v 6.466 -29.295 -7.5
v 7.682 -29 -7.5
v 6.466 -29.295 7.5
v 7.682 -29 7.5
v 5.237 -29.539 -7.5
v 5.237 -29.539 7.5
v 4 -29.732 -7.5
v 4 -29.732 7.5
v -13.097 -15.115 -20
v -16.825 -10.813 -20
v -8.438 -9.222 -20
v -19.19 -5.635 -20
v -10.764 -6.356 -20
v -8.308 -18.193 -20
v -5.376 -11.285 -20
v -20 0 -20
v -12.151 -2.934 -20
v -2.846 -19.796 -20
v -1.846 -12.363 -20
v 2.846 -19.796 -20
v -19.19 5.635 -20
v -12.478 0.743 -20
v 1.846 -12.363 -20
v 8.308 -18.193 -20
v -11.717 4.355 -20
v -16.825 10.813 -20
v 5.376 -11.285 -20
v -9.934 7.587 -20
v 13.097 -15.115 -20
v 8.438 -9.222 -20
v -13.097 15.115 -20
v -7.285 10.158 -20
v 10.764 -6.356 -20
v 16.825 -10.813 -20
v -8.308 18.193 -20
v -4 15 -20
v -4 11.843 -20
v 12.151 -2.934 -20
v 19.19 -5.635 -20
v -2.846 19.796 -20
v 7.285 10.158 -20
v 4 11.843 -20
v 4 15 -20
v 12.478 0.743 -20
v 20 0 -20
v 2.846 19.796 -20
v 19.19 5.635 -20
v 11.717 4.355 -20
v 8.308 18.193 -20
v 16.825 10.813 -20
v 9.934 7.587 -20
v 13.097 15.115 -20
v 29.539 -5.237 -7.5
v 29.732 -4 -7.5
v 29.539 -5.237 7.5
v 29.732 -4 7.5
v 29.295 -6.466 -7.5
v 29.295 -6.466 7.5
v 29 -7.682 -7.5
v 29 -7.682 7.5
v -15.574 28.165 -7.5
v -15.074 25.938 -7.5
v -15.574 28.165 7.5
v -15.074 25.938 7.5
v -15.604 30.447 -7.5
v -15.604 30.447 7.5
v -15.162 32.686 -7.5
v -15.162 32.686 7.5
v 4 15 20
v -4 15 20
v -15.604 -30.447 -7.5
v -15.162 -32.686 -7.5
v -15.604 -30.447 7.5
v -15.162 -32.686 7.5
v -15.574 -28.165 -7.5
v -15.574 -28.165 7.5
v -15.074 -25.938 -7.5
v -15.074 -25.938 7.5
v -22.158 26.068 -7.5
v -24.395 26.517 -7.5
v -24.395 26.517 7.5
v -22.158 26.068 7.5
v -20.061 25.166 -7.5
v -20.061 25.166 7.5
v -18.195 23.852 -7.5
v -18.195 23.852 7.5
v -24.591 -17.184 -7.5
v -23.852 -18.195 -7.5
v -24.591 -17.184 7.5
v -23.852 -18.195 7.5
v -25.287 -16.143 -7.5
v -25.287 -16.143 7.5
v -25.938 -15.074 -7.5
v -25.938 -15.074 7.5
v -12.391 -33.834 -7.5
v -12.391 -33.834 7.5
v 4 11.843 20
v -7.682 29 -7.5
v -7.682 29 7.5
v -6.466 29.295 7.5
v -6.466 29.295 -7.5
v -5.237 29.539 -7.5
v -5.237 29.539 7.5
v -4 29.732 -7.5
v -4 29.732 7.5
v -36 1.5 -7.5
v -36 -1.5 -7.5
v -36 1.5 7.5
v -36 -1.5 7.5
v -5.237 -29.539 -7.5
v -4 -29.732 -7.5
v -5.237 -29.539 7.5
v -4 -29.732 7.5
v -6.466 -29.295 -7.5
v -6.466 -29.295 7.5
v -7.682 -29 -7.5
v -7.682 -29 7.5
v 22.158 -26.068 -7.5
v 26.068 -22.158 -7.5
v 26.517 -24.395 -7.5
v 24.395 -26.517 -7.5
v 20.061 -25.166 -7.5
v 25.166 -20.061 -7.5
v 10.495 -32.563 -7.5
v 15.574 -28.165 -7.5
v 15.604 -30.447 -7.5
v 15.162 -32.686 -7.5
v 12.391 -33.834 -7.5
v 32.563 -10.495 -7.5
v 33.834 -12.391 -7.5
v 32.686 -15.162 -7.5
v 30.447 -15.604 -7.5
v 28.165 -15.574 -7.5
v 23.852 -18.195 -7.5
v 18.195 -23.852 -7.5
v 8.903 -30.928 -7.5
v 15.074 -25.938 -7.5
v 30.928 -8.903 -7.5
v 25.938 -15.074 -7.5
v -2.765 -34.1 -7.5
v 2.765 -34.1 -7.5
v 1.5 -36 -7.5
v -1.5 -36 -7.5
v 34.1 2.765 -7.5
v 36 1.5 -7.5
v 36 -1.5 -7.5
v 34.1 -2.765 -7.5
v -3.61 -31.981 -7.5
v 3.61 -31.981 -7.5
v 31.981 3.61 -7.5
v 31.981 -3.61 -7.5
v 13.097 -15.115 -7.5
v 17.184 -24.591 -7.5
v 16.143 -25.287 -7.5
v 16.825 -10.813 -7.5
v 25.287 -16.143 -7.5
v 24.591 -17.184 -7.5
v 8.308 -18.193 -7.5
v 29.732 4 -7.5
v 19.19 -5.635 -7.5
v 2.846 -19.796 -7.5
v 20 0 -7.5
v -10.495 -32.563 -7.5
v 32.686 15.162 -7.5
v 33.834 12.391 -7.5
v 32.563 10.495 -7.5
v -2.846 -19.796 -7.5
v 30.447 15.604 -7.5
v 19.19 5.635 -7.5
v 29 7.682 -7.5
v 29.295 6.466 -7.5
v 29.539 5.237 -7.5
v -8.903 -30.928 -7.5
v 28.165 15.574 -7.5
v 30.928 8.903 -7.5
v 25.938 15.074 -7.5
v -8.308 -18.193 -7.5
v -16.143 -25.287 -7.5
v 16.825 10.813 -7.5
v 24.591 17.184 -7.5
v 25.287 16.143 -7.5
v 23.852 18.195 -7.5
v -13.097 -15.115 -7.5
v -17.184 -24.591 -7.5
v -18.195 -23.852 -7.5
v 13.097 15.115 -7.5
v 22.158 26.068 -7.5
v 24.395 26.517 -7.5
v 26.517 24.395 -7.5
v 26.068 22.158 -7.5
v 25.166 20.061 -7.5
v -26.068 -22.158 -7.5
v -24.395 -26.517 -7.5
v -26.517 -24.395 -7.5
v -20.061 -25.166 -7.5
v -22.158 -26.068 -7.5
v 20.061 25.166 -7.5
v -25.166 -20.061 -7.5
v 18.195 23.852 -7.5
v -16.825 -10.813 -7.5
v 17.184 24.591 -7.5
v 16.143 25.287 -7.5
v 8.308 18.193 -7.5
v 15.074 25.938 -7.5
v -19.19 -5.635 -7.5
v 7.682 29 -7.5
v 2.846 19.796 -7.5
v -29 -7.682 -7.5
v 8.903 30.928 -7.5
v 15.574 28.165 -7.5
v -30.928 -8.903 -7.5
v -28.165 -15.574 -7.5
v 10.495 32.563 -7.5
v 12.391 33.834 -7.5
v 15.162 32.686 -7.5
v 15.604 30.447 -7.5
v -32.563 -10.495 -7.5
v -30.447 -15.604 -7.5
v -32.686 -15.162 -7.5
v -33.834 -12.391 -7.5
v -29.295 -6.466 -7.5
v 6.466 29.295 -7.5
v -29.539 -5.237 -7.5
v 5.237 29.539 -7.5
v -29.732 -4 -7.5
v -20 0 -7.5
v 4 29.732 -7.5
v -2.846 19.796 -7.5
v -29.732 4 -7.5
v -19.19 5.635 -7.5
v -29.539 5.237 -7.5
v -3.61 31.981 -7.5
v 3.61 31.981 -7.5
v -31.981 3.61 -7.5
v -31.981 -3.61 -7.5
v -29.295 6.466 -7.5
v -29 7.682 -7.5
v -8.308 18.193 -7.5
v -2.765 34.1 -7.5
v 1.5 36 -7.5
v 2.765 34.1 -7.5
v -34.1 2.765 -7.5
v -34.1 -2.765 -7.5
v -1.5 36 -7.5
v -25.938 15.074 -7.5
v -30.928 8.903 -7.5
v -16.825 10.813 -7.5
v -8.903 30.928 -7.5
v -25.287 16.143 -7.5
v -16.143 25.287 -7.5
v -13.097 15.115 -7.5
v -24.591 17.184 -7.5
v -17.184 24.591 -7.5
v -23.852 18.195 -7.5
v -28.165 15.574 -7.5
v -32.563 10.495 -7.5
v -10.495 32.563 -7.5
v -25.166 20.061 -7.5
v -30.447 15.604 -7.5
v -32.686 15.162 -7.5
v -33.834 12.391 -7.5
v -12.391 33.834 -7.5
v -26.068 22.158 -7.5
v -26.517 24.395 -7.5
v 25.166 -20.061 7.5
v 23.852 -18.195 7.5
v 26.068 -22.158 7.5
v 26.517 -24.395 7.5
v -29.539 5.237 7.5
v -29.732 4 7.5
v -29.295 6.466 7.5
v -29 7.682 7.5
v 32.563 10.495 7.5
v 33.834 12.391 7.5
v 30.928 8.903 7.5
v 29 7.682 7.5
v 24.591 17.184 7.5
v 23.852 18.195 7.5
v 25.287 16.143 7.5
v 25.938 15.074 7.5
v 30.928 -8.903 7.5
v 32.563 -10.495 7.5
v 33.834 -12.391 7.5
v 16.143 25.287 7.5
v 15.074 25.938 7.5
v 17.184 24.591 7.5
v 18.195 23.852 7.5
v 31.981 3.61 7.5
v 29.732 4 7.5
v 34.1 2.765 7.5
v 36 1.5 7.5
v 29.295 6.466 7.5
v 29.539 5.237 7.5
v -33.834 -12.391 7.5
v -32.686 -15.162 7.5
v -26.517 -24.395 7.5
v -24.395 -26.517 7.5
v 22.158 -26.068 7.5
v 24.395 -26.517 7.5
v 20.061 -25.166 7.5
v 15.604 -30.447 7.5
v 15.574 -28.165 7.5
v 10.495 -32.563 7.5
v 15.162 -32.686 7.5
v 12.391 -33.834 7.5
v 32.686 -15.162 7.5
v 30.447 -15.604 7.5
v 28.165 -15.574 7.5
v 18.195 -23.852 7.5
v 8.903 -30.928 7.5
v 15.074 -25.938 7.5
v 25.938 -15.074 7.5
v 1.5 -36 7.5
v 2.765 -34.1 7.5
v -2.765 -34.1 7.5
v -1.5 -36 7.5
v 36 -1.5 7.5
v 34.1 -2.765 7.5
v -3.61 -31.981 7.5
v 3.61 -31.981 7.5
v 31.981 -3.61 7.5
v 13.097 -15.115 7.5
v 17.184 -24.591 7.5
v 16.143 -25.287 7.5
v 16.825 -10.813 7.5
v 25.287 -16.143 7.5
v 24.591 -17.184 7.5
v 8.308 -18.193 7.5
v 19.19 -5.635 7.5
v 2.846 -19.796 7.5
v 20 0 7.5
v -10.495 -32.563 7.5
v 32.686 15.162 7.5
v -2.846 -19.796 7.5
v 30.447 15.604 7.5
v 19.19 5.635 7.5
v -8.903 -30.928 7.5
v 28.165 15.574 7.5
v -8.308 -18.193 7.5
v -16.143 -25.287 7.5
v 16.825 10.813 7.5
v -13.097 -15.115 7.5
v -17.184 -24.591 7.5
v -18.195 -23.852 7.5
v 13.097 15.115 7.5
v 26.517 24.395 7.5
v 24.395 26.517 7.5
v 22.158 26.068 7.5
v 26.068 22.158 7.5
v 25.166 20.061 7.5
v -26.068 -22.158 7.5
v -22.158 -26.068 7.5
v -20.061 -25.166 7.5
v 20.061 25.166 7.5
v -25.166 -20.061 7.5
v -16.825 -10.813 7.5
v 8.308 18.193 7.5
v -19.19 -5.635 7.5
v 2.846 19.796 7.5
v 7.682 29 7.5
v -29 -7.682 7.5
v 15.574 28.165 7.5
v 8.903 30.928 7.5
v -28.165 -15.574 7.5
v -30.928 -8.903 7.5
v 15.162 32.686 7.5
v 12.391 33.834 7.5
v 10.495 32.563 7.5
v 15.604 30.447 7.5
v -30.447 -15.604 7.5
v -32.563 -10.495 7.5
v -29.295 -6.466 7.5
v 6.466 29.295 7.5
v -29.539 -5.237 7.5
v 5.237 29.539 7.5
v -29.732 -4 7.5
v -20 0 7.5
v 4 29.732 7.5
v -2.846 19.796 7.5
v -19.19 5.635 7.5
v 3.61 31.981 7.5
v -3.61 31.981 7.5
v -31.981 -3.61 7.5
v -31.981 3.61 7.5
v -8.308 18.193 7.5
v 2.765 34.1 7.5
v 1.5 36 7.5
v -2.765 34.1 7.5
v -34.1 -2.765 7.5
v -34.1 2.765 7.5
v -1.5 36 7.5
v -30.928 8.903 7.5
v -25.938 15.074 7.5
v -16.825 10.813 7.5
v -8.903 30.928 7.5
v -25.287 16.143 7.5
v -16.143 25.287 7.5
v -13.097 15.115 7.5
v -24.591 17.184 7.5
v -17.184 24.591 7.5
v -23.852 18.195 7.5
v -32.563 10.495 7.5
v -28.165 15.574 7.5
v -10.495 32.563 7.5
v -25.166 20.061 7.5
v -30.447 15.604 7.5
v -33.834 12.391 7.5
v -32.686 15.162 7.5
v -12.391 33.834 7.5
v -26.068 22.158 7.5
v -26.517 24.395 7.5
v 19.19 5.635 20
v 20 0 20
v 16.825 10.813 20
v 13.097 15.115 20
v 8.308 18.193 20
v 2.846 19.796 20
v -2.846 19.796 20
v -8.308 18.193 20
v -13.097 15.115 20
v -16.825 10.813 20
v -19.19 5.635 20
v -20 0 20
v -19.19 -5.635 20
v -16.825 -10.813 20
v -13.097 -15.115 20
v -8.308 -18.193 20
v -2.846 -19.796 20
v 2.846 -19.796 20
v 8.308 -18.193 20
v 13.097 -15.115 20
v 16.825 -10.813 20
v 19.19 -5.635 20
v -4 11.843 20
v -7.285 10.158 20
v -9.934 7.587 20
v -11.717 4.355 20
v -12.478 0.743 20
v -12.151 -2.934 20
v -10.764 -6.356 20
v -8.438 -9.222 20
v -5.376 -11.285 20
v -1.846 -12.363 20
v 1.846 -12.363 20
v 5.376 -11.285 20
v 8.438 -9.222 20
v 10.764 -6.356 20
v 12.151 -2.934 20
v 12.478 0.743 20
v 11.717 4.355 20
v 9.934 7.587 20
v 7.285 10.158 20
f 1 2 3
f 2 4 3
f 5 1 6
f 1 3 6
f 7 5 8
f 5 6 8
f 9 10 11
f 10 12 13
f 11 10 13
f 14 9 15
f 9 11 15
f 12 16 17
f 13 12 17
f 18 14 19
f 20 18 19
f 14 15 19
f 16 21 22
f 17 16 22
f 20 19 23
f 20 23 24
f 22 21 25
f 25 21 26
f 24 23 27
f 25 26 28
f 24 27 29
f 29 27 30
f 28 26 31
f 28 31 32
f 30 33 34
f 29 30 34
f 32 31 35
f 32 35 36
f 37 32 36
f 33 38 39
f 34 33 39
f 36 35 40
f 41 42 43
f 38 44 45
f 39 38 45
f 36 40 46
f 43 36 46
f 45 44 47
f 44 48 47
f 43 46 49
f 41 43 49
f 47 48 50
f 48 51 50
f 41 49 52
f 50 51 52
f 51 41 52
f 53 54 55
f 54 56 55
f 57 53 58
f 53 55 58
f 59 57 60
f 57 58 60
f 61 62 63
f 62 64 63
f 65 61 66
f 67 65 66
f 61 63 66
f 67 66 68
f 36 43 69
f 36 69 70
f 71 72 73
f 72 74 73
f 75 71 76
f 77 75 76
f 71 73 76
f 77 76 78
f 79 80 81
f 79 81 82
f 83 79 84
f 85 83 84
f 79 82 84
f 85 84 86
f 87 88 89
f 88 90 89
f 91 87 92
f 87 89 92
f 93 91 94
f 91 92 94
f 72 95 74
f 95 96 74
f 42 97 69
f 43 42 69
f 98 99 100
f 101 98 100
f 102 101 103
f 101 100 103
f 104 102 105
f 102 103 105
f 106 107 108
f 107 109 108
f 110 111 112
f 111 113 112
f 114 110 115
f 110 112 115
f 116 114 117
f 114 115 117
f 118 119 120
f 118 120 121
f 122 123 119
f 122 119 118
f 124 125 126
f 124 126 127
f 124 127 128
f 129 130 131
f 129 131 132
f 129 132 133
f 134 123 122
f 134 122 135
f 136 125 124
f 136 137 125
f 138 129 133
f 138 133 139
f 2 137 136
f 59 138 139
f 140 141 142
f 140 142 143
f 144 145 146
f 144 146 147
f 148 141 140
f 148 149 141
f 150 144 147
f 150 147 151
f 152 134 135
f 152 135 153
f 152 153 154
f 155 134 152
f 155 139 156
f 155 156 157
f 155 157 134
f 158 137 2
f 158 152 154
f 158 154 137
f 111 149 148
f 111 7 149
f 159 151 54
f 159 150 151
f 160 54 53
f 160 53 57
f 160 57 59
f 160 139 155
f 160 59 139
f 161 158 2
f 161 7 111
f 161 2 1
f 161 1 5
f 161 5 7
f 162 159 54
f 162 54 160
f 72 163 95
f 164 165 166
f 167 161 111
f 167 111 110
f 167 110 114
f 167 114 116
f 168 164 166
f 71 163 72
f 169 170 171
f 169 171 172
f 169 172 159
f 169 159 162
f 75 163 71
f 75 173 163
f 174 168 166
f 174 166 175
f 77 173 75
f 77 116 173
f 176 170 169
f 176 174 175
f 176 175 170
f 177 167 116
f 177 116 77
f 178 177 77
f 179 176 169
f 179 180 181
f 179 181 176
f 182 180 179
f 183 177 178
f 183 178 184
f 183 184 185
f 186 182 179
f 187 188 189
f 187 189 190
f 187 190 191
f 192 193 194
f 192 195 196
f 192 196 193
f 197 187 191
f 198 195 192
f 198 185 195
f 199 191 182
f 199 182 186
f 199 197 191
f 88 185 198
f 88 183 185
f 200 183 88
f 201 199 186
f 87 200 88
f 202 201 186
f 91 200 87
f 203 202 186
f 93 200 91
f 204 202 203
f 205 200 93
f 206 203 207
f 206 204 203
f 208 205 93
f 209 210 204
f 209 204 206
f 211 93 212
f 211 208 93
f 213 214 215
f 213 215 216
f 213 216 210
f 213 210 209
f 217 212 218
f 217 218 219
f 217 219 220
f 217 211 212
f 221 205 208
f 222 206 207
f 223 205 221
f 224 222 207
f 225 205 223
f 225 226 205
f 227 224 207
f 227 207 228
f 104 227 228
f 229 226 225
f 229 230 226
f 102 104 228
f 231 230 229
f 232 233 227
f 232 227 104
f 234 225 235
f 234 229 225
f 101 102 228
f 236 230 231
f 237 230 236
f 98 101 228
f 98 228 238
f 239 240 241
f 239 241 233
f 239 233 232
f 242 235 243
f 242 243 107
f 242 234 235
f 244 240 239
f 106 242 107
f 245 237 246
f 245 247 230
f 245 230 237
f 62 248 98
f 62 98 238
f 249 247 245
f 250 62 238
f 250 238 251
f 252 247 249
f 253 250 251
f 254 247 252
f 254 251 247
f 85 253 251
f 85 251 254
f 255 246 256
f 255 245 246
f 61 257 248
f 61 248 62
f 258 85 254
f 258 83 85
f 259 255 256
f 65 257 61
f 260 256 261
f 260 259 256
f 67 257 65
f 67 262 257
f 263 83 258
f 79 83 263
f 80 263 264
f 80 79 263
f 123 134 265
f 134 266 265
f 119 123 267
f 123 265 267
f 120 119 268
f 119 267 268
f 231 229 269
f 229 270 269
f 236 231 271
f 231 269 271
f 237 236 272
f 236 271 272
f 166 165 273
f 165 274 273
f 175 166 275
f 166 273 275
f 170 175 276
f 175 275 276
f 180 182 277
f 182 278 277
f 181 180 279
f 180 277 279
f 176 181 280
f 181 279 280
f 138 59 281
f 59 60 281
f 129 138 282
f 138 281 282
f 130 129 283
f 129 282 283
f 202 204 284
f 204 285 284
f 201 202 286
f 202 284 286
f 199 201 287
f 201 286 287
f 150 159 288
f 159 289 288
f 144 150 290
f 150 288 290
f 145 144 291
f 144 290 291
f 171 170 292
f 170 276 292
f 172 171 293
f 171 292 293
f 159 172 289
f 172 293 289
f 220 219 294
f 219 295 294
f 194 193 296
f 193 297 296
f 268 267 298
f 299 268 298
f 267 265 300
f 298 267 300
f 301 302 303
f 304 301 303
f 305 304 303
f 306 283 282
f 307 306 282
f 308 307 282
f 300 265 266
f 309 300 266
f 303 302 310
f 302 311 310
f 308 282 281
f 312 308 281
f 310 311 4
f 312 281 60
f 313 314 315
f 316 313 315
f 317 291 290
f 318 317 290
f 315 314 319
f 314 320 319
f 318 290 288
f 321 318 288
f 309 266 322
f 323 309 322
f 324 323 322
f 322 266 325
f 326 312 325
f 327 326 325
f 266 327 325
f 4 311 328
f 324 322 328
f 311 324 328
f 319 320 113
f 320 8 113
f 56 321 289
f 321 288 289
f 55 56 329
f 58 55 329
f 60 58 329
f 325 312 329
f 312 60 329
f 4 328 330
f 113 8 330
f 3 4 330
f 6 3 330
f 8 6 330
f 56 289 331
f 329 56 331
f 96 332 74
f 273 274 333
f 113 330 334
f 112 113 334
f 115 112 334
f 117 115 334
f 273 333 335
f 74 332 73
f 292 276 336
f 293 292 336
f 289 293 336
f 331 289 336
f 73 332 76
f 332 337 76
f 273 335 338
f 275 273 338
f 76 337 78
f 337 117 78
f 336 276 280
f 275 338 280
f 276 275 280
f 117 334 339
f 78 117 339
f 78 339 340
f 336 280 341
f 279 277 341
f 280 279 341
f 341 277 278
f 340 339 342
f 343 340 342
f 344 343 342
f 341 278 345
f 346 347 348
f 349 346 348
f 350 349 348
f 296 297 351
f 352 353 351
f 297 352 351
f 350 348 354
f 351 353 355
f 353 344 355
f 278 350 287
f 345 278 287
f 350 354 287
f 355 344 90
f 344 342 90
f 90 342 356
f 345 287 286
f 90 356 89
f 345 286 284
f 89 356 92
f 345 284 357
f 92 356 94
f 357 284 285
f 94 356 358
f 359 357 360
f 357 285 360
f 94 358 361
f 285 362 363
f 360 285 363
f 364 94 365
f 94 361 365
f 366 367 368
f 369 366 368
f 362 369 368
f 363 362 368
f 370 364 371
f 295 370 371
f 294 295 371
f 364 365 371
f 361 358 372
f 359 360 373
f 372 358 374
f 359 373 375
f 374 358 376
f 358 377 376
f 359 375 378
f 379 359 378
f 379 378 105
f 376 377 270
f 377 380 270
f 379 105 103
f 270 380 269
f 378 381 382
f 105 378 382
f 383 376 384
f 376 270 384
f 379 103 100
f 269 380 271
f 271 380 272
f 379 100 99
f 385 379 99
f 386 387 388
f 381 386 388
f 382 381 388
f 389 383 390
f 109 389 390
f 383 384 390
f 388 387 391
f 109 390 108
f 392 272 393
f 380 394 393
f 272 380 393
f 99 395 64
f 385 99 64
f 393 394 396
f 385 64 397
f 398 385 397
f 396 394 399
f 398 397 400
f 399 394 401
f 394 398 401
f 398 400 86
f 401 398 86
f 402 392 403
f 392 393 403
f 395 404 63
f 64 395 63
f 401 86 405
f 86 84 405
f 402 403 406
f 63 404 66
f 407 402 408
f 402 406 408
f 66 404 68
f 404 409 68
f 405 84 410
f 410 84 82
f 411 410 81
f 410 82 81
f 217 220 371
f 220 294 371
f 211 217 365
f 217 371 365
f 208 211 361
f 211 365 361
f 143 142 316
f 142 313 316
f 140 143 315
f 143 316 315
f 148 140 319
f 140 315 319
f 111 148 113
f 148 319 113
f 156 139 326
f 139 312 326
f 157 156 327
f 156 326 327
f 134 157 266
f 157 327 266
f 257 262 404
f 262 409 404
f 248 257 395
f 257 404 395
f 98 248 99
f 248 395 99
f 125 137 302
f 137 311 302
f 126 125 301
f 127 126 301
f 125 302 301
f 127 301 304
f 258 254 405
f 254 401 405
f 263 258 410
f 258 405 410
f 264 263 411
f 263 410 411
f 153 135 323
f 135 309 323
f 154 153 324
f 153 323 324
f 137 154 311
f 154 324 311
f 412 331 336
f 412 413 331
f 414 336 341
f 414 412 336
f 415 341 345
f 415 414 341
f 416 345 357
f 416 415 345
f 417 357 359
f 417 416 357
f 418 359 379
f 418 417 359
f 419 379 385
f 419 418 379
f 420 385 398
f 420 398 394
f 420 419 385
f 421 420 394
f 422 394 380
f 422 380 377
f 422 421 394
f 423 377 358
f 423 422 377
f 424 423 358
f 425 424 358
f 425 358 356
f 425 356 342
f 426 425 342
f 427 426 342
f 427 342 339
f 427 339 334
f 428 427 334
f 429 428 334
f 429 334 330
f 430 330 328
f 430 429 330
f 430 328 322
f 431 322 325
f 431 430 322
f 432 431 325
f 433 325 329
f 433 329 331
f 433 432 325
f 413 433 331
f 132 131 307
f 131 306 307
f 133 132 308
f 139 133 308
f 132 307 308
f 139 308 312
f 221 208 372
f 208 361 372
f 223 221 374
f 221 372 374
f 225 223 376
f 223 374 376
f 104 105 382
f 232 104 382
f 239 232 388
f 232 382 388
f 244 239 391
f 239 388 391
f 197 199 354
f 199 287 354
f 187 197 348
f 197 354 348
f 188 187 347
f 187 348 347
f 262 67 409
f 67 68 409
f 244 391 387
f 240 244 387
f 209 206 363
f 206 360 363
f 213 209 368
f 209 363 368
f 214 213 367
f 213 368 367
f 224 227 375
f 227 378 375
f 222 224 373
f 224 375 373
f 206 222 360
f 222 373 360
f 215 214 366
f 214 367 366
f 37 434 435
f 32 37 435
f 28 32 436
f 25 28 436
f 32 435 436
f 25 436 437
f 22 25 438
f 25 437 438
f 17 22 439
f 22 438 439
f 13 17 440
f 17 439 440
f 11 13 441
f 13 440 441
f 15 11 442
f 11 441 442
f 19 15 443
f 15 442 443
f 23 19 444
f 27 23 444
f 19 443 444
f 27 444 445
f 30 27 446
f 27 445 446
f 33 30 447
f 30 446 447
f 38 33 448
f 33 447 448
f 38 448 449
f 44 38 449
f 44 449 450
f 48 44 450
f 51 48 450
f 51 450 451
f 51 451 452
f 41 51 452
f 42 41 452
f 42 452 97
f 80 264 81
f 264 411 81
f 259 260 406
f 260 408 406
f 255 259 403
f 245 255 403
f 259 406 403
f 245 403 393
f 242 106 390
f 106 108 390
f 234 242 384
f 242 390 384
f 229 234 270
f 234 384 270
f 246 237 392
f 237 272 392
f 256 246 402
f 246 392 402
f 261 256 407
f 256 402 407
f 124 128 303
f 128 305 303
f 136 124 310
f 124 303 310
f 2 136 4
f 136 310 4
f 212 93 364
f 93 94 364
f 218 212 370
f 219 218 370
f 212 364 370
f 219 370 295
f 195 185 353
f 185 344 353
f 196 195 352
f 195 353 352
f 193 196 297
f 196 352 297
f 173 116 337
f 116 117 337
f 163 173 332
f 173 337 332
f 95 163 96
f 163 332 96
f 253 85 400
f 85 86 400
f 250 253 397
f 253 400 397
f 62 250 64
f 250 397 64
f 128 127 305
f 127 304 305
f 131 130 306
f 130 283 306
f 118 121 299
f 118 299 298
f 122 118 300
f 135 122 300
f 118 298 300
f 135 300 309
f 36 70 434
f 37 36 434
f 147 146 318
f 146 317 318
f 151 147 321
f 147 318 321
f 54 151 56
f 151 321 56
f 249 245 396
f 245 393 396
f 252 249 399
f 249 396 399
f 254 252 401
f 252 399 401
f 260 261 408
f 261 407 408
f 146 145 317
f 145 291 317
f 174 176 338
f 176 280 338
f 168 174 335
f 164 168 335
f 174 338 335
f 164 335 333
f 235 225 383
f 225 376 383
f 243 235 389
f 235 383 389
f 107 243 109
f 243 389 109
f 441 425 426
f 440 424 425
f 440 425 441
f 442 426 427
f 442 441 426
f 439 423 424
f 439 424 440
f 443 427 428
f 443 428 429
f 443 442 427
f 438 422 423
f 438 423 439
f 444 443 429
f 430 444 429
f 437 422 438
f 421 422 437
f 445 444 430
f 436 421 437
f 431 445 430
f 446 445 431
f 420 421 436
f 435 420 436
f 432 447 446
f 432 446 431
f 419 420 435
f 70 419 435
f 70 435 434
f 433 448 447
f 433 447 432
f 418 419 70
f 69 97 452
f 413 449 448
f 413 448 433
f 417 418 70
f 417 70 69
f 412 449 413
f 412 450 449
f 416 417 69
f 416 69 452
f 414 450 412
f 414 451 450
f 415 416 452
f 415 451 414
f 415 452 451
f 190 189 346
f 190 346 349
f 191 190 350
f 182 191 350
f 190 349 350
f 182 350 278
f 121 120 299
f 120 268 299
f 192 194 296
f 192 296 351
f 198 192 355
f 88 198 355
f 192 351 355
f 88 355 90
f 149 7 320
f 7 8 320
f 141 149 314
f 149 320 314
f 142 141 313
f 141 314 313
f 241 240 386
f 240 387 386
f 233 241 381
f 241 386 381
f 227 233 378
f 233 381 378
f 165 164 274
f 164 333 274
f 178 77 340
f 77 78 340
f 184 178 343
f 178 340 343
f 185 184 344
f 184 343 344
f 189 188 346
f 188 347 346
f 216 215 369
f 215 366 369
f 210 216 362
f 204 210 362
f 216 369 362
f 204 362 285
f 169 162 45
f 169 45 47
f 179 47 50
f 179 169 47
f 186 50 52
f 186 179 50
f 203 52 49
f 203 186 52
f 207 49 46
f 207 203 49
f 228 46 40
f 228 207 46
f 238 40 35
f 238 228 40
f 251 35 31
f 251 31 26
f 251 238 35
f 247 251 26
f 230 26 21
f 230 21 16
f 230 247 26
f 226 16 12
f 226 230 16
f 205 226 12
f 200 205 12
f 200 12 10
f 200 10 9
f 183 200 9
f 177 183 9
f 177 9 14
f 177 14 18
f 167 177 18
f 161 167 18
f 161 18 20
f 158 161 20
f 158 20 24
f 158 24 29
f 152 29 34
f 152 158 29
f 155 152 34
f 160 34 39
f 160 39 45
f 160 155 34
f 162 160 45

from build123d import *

# Parameters (mm, degrees)
BOSS_EXTRUDE1_DEPTH = 7.5
SKETCH2_R           = 20
BOSS_EXTRUDE2_DEPTH = 20
CUT_EXTRUDE1_DEPTH  = 41


with BuildPart() as part:
    # Sketch1 → Boss-Extrude1 (new body, symmetric)
    with BuildSketch(Plane.XY):
        with BuildLine():
            Line((-1.5, 36), (1.5, 36))
            ThreePointArc((1.5, 36), (3.242504384, 33.062509074), (4, 29.732137495))
            ThreePointArc((4, 29.732137495), (5.85270966, 29.423558412), (7.682478298, 28.999647019))
            ThreePointArc((7.682478298, 28.999647019), (9.656791021, 31.786628134), (12.390784266, 33.833688319))
            Line((12.390784266, 33.833688319), (15.162422864, 32.685638022))
            ThreePointArc((15.162422864, 32.685638022), (15.64815789, 29.30492272), (15.073514558, 25.93817956))
            ThreePointArc((15.073514558, 25.93817956), (16.667106991, 24.944088369), (18.195368917, 23.852223166))
            ThreePointArc((18.195368917, 23.852223166), (21.085927531, 25.671521208), (24.395183951, 26.516504294))
            Line((24.395183951, 26.516504294), (26.516504294, 24.395183951))
            ThreePointArc((26.516504294, 24.395183951), (25.671521208, 21.085927531), (23.852223166, 18.195368917))
            ThreePointArc((23.852223166, 18.195368917), (24.944088369, 16.667106991), (25.93817956, 15.073514558))
            ThreePointArc((25.93817956, 15.073514558), (29.30492272, 15.64815789), (32.685638022, 15.162422864))
            Line((32.685638022, 15.162422864), (33.833688319, 12.390784266))
            ThreePointArc((33.833688319, 12.390784266), (31.786628134, 9.656791021), (28.999647019, 7.682478298))
            ThreePointArc((28.999647019, 7.682478298), (29.423558412, 5.85270966), (29.732137495, 4))
            ThreePointArc((29.732137495, 4), (33.062509074, 3.242504384), (36, 1.5))
            Line((36, 1.5), (36, -1.5))
            ThreePointArc((36, -1.5), (33.062509074, -3.242504384), (29.732137495, -4))
            ThreePointArc((29.732137495, -4), (29.423558412, -5.85270966), (28.999647019, -7.682478298))
            ThreePointArc((28.999647019, -7.682478298), (31.786628134, -9.656791021), (33.833688319, -12.390784266))
            Line((33.833688319, -12.390784266), (32.685638022, -15.162422864))
            ThreePointArc((32.685638022, -15.162422864), (29.30492272, -15.64815789), (25.93817956, -15.073514558))
            ThreePointArc((25.93817956, -15.073514558), (24.944088369, -16.667106991), (23.852223166, -18.195368917))
            ThreePointArc((23.852223166, -18.195368917), (25.671521208, -21.085927531), (26.516504294, -24.395183951))
            Line((26.516504294, -24.395183951), (24.395183951, -26.516504294))
            ThreePointArc((24.395183951, -26.516504294), (21.085927531, -25.671521208), (18.195368917, -23.852223166))
            ThreePointArc((18.195368917, -23.852223166), (16.667106991, -24.944088369), (15.073514558, -25.93817956))
            ThreePointArc((15.073514558, -25.93817956), (15.64815789, -29.30492272), (15.162422864, -32.685638022))
            Line((15.162422864, -32.685638022), (12.390784266, -33.833688319))
            ThreePointArc((12.390784266, -33.833688319), (9.656791021, -31.786628134), (7.682478298, -28.999647019))
            ThreePointArc((7.682478298, -28.999647019), (5.85270966, -29.423558412), (4, -29.732137495))
            ThreePointArc((4, -29.732137495), (3.242504384, -33.062509074), (1.5, -36))
            Line((1.5, -36), (-1.5, -36))
            ThreePointArc((-1.5, -36), (-3.242504384, -33.062509074), (-4, -29.732137495))
            ThreePointArc((-4, -29.732137495), (-5.85270966, -29.423558412), (-7.682478298, -28.999647019))
            ThreePointArc((-7.682478298, -28.999647019), (-9.656791021, -31.786628134), (-12.390784266, -33.833688319))
            Line((-12.390784266, -33.833688319), (-15.162422864, -32.685638022))
            ThreePointArc((-15.162422864, -32.685638022), (-15.64815789, -29.30492272), (-15.073514558, -25.93817956))
            ThreePointArc((-15.073514558, -25.93817956), (-16.667106991, -24.944088369), (-18.195368917, -23.852223166))
            ThreePointArc((-18.195368917, -23.852223166), (-21.085927531, -25.671521208), (-24.395183951, -26.516504294))
            Line((-24.395183951, -26.516504294), (-26.516504294, -24.395183951))
            ThreePointArc((-26.516504294, -24.395183951), (-25.671521208, -21.085927531), (-23.852223166, -18.195368917))
            ThreePointArc((-23.852223166, -18.195368917), (-24.944088369, -16.667106991), (-25.93817956, -15.073514558))
            ThreePointArc((-25.93817956, -15.073514558), (-29.30492272, -15.64815789), (-32.685638022, -15.162422864))
            Line((-32.685638022, -15.162422864), (-33.833688319, -12.390784266))
            ThreePointArc((-33.833688319, -12.390784266), (-31.786628134, -9.656791021), (-28.999647019, -7.682478298))
            ThreePointArc((-28.999647019, -7.682478298), (-29.423558412, -5.85270966), (-29.732137495, -4))
            ThreePointArc((-29.732137495, -4), (-33.062509074, -3.242504384), (-36, -1.5))
            Line((-36, -1.5), (-36, 1.5))
            ThreePointArc((-36, 1.5), (-33.062509074, 3.242504384), (-29.732137495, 4))
            ThreePointArc((-29.732137495, 4), (-29.423558412, 5.85270966), (-28.999647019, 7.682478298))
            ThreePointArc((-28.999647019, 7.682478298), (-31.786628134, 9.656791021), (-33.833688319, 12.390784266))
            Line((-33.833688319, 12.390784266), (-32.685638022, 15.162422864))
            ThreePointArc((-32.685638022, 15.162422864), (-29.30492272, 15.64815789), (-25.93817956, 15.073514558))
            ThreePointArc((-25.93817956, 15.073514558), (-24.944088369, 16.667106991), (-23.852223166, 18.195368917))
            ThreePointArc((-23.852223166, 18.195368917), (-25.671521208, 21.085927531), (-26.516504294, 24.395183951))
            Line((-26.516504294, 24.395183951), (-24.395183951, 26.516504294))
            ThreePointArc((-24.395183951, 26.516504294), (-21.085927531, 25.671521208), (-18.195368917, 23.852223166))
            ThreePointArc((-18.195368917, 23.852223166), (-16.667106991, 24.944088369), (-15.073514558, 25.93817956))
            ThreePointArc((-15.073514558, 25.93817956), (-15.64815789, 29.30492272), (-15.162422864, 32.685638022))
            Line((-15.162422864, 32.685638022), (-12.390784266, 33.833688319))
            ThreePointArc((-12.390784266, 33.833688319), (-9.656791021, 31.786628134), (-7.682478298, 28.999647019))
            ThreePointArc((-7.682478298, 28.999647019), (-5.85270966, 29.423558412), (-4, 29.732137495))
            ThreePointArc((-4, 29.732137495), (-3.242504384, 33.062509074), (-1.5, 36))
        make_face()
    extrude(amount=BOSS_EXTRUDE1_DEPTH, both=True)

    # Sketch2 → Boss-Extrude2 (add, symmetric)
    with BuildSketch(Plane.XY):
        Circle(SKETCH2_R)
    extrude(amount=BOSS_EXTRUDE2_DEPTH, both=True)

    # Sketch3 → Cut-Extrude1 (cut, through all)
    with BuildSketch(Plane.XY.offset(20)):
        with BuildLine():
            Line((-4, 15), (-4, 11.842719282))
            ThreePointArc((-4, 11.842719282), (0, -12.5), (4, 11.842719282))
            Line((4, 11.842719282), (4, 15))
            Line((4, 15), (-4, 15))
        make_face()
    extrude(amount=-CUT_EXTRUDE1_DEPTH, mode=Mode.SUBTRACT)


solid = part.part
